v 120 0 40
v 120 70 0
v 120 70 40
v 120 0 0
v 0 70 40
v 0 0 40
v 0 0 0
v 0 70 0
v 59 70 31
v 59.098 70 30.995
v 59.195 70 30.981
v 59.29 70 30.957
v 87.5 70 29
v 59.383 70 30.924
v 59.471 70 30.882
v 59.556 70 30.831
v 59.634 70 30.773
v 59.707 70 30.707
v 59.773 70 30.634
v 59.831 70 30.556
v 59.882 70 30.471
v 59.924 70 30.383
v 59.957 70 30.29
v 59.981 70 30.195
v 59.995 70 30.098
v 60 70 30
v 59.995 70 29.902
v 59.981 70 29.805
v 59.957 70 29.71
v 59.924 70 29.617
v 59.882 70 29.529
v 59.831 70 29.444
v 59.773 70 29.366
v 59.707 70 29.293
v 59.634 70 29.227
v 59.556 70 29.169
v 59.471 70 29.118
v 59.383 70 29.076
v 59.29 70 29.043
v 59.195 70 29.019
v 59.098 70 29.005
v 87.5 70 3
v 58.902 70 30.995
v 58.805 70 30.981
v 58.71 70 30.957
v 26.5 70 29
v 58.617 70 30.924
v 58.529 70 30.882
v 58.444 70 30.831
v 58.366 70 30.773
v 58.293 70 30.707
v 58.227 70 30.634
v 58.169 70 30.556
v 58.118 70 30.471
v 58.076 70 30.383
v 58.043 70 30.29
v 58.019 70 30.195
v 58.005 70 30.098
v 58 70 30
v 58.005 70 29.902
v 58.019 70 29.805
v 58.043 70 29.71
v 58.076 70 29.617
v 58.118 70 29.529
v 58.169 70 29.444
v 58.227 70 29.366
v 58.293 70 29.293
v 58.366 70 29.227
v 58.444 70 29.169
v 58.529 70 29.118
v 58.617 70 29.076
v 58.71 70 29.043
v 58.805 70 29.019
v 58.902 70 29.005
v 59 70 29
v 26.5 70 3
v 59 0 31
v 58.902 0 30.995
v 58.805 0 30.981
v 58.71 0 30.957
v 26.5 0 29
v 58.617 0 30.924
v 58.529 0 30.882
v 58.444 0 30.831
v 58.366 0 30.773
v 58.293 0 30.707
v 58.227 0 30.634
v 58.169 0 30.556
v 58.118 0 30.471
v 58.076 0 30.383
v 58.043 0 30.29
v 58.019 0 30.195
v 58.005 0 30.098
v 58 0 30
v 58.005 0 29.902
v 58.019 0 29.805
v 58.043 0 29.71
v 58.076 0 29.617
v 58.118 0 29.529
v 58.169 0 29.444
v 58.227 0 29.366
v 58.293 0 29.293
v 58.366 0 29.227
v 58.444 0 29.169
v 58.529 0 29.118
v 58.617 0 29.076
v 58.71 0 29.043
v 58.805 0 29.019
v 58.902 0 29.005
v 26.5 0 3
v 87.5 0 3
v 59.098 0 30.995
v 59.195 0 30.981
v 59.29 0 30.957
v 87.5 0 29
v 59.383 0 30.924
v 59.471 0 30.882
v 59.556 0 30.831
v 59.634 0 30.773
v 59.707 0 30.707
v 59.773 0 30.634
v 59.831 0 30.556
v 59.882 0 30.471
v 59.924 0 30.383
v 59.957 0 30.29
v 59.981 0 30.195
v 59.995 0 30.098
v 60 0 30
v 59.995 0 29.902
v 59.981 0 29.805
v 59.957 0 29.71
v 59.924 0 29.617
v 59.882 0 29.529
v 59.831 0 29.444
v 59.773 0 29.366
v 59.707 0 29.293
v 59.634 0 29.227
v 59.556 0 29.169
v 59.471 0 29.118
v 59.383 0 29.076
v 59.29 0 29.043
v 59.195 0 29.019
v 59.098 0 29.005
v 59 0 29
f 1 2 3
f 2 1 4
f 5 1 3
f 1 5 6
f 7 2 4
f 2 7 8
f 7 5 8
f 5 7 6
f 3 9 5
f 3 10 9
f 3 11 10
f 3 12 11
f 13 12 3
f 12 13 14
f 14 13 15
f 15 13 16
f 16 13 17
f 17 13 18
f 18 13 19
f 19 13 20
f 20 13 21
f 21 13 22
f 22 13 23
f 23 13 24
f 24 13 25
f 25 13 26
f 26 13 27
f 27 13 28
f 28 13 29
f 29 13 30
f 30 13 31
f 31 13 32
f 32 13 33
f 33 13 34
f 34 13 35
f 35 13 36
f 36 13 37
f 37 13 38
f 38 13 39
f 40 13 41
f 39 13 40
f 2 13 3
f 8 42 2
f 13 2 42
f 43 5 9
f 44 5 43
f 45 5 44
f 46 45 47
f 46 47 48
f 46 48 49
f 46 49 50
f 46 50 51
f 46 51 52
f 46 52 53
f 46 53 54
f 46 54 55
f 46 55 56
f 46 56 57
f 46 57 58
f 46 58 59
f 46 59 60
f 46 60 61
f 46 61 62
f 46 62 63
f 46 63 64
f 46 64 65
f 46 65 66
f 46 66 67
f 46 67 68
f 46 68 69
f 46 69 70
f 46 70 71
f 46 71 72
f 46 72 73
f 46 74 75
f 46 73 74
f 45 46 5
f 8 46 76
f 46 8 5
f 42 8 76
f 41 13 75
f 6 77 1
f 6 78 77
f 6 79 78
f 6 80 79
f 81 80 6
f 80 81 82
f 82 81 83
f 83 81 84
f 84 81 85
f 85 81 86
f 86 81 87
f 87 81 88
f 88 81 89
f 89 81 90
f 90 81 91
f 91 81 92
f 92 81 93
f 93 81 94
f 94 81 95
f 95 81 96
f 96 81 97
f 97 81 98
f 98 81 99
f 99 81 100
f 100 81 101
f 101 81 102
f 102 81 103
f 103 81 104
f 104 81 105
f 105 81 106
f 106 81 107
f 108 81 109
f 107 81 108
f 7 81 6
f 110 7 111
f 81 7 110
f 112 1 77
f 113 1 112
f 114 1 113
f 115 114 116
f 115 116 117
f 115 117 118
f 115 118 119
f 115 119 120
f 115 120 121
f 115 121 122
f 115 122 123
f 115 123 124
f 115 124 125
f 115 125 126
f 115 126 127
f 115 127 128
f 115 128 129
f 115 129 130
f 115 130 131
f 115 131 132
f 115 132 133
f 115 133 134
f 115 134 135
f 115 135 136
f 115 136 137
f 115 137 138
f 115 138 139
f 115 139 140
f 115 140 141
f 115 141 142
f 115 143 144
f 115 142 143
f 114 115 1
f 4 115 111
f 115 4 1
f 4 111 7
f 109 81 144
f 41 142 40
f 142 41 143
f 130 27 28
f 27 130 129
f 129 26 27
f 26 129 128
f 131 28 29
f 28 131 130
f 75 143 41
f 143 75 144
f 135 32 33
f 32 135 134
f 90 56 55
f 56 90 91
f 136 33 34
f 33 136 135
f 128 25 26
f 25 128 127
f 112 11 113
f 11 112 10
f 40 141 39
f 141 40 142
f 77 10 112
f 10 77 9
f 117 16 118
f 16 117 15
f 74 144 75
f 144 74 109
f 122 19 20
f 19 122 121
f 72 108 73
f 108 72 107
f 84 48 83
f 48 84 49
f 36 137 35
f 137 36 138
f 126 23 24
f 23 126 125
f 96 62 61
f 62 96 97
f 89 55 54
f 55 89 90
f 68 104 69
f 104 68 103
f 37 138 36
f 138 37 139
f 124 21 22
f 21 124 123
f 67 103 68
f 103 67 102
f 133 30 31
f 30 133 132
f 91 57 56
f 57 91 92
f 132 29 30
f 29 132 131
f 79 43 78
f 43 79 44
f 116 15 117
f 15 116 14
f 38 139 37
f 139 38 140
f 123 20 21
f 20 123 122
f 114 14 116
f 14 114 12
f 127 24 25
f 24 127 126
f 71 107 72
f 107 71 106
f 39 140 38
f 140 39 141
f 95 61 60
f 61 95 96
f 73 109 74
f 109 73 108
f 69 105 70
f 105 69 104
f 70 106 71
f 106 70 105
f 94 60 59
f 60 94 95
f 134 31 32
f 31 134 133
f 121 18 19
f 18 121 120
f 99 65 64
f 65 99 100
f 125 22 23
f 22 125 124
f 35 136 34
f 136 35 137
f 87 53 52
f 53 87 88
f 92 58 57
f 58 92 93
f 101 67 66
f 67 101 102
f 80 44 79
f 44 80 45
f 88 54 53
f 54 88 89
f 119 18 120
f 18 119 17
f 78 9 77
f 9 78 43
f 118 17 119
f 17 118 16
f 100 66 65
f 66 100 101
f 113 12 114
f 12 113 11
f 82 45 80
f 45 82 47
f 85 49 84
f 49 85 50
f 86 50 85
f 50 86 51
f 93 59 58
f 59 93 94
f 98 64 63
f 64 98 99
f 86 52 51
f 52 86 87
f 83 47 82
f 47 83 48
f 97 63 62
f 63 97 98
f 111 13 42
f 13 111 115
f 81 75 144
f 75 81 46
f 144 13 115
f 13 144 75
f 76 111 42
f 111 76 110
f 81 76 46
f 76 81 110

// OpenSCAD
// Buffer tank for mini horizontal gel-electrophoresis box
// Units: mm. Print orientation: open top, resting on XY plane at z = 0.

$fn = 64;

// ---- Tank ----
outer_x      = 120;   // tank outer length (X)
outer_y      = 70;    // tank outer width (Y)
tank_h       = 40;    // tank outer height (Z)
wall         = 3;     // tank wall thickness
floor_t      = 3;     // tank floor thickness

// ---- Gel-tray platform ----
plat_x       = 60;    // platform length in X (centred)
plat_y       = 70;    // platform width in Y (full inner width)
plat_top_z   = 10;    // platform top height above inner floor
                // (note: user gave z = 13 even though inner floor is at z = 3)

// ---- Electrode holes ----
hole_d       = 2;     // electrode hole diameter
hole_y       = 0;     // electrode hole Y position
hole_z       = 30;    // electrode hole Z position

// ---- Misc ----
eps          = 0.5;   // cutter overshoot past faces

// Inner dimensions
inner_x = outer_x - 2*wall;
inner_z = tank_h - floor_t;

// Platform legs (simplified) extending from top down to the floor
leg_h = plat_top_z + floor_t;

difference() {
    union() {
        // Tank body
        cube([outer_x, outer_y, tank_h]);
        // Raised platform
        translate([(outer_x - plat_x)/2, 0, plat_top_z])
            cube([plat_x, plat_y, leg_h]);
    }

    // Chamber divider: runs along Y, sits on top of the floor,
    // leaving an open gap above the platform so the chambers connect.
    translate([(inner_x - plat_x)/2 - eps, 0, floor_t])
        cube([plat_x + 2*eps, outer_y, inner_z - plat_top_z - 1]);

    // Electrode wires: horizontal holes along X through each end wall
    for (s = [-1, 1])
        translate([s * (outer_x/2 - hole_d/2), hole_y, hole_z])
            rotate([-90, 0, 0]) cylinder(d = hole_d, h = outer_x + 2*eps);
}
